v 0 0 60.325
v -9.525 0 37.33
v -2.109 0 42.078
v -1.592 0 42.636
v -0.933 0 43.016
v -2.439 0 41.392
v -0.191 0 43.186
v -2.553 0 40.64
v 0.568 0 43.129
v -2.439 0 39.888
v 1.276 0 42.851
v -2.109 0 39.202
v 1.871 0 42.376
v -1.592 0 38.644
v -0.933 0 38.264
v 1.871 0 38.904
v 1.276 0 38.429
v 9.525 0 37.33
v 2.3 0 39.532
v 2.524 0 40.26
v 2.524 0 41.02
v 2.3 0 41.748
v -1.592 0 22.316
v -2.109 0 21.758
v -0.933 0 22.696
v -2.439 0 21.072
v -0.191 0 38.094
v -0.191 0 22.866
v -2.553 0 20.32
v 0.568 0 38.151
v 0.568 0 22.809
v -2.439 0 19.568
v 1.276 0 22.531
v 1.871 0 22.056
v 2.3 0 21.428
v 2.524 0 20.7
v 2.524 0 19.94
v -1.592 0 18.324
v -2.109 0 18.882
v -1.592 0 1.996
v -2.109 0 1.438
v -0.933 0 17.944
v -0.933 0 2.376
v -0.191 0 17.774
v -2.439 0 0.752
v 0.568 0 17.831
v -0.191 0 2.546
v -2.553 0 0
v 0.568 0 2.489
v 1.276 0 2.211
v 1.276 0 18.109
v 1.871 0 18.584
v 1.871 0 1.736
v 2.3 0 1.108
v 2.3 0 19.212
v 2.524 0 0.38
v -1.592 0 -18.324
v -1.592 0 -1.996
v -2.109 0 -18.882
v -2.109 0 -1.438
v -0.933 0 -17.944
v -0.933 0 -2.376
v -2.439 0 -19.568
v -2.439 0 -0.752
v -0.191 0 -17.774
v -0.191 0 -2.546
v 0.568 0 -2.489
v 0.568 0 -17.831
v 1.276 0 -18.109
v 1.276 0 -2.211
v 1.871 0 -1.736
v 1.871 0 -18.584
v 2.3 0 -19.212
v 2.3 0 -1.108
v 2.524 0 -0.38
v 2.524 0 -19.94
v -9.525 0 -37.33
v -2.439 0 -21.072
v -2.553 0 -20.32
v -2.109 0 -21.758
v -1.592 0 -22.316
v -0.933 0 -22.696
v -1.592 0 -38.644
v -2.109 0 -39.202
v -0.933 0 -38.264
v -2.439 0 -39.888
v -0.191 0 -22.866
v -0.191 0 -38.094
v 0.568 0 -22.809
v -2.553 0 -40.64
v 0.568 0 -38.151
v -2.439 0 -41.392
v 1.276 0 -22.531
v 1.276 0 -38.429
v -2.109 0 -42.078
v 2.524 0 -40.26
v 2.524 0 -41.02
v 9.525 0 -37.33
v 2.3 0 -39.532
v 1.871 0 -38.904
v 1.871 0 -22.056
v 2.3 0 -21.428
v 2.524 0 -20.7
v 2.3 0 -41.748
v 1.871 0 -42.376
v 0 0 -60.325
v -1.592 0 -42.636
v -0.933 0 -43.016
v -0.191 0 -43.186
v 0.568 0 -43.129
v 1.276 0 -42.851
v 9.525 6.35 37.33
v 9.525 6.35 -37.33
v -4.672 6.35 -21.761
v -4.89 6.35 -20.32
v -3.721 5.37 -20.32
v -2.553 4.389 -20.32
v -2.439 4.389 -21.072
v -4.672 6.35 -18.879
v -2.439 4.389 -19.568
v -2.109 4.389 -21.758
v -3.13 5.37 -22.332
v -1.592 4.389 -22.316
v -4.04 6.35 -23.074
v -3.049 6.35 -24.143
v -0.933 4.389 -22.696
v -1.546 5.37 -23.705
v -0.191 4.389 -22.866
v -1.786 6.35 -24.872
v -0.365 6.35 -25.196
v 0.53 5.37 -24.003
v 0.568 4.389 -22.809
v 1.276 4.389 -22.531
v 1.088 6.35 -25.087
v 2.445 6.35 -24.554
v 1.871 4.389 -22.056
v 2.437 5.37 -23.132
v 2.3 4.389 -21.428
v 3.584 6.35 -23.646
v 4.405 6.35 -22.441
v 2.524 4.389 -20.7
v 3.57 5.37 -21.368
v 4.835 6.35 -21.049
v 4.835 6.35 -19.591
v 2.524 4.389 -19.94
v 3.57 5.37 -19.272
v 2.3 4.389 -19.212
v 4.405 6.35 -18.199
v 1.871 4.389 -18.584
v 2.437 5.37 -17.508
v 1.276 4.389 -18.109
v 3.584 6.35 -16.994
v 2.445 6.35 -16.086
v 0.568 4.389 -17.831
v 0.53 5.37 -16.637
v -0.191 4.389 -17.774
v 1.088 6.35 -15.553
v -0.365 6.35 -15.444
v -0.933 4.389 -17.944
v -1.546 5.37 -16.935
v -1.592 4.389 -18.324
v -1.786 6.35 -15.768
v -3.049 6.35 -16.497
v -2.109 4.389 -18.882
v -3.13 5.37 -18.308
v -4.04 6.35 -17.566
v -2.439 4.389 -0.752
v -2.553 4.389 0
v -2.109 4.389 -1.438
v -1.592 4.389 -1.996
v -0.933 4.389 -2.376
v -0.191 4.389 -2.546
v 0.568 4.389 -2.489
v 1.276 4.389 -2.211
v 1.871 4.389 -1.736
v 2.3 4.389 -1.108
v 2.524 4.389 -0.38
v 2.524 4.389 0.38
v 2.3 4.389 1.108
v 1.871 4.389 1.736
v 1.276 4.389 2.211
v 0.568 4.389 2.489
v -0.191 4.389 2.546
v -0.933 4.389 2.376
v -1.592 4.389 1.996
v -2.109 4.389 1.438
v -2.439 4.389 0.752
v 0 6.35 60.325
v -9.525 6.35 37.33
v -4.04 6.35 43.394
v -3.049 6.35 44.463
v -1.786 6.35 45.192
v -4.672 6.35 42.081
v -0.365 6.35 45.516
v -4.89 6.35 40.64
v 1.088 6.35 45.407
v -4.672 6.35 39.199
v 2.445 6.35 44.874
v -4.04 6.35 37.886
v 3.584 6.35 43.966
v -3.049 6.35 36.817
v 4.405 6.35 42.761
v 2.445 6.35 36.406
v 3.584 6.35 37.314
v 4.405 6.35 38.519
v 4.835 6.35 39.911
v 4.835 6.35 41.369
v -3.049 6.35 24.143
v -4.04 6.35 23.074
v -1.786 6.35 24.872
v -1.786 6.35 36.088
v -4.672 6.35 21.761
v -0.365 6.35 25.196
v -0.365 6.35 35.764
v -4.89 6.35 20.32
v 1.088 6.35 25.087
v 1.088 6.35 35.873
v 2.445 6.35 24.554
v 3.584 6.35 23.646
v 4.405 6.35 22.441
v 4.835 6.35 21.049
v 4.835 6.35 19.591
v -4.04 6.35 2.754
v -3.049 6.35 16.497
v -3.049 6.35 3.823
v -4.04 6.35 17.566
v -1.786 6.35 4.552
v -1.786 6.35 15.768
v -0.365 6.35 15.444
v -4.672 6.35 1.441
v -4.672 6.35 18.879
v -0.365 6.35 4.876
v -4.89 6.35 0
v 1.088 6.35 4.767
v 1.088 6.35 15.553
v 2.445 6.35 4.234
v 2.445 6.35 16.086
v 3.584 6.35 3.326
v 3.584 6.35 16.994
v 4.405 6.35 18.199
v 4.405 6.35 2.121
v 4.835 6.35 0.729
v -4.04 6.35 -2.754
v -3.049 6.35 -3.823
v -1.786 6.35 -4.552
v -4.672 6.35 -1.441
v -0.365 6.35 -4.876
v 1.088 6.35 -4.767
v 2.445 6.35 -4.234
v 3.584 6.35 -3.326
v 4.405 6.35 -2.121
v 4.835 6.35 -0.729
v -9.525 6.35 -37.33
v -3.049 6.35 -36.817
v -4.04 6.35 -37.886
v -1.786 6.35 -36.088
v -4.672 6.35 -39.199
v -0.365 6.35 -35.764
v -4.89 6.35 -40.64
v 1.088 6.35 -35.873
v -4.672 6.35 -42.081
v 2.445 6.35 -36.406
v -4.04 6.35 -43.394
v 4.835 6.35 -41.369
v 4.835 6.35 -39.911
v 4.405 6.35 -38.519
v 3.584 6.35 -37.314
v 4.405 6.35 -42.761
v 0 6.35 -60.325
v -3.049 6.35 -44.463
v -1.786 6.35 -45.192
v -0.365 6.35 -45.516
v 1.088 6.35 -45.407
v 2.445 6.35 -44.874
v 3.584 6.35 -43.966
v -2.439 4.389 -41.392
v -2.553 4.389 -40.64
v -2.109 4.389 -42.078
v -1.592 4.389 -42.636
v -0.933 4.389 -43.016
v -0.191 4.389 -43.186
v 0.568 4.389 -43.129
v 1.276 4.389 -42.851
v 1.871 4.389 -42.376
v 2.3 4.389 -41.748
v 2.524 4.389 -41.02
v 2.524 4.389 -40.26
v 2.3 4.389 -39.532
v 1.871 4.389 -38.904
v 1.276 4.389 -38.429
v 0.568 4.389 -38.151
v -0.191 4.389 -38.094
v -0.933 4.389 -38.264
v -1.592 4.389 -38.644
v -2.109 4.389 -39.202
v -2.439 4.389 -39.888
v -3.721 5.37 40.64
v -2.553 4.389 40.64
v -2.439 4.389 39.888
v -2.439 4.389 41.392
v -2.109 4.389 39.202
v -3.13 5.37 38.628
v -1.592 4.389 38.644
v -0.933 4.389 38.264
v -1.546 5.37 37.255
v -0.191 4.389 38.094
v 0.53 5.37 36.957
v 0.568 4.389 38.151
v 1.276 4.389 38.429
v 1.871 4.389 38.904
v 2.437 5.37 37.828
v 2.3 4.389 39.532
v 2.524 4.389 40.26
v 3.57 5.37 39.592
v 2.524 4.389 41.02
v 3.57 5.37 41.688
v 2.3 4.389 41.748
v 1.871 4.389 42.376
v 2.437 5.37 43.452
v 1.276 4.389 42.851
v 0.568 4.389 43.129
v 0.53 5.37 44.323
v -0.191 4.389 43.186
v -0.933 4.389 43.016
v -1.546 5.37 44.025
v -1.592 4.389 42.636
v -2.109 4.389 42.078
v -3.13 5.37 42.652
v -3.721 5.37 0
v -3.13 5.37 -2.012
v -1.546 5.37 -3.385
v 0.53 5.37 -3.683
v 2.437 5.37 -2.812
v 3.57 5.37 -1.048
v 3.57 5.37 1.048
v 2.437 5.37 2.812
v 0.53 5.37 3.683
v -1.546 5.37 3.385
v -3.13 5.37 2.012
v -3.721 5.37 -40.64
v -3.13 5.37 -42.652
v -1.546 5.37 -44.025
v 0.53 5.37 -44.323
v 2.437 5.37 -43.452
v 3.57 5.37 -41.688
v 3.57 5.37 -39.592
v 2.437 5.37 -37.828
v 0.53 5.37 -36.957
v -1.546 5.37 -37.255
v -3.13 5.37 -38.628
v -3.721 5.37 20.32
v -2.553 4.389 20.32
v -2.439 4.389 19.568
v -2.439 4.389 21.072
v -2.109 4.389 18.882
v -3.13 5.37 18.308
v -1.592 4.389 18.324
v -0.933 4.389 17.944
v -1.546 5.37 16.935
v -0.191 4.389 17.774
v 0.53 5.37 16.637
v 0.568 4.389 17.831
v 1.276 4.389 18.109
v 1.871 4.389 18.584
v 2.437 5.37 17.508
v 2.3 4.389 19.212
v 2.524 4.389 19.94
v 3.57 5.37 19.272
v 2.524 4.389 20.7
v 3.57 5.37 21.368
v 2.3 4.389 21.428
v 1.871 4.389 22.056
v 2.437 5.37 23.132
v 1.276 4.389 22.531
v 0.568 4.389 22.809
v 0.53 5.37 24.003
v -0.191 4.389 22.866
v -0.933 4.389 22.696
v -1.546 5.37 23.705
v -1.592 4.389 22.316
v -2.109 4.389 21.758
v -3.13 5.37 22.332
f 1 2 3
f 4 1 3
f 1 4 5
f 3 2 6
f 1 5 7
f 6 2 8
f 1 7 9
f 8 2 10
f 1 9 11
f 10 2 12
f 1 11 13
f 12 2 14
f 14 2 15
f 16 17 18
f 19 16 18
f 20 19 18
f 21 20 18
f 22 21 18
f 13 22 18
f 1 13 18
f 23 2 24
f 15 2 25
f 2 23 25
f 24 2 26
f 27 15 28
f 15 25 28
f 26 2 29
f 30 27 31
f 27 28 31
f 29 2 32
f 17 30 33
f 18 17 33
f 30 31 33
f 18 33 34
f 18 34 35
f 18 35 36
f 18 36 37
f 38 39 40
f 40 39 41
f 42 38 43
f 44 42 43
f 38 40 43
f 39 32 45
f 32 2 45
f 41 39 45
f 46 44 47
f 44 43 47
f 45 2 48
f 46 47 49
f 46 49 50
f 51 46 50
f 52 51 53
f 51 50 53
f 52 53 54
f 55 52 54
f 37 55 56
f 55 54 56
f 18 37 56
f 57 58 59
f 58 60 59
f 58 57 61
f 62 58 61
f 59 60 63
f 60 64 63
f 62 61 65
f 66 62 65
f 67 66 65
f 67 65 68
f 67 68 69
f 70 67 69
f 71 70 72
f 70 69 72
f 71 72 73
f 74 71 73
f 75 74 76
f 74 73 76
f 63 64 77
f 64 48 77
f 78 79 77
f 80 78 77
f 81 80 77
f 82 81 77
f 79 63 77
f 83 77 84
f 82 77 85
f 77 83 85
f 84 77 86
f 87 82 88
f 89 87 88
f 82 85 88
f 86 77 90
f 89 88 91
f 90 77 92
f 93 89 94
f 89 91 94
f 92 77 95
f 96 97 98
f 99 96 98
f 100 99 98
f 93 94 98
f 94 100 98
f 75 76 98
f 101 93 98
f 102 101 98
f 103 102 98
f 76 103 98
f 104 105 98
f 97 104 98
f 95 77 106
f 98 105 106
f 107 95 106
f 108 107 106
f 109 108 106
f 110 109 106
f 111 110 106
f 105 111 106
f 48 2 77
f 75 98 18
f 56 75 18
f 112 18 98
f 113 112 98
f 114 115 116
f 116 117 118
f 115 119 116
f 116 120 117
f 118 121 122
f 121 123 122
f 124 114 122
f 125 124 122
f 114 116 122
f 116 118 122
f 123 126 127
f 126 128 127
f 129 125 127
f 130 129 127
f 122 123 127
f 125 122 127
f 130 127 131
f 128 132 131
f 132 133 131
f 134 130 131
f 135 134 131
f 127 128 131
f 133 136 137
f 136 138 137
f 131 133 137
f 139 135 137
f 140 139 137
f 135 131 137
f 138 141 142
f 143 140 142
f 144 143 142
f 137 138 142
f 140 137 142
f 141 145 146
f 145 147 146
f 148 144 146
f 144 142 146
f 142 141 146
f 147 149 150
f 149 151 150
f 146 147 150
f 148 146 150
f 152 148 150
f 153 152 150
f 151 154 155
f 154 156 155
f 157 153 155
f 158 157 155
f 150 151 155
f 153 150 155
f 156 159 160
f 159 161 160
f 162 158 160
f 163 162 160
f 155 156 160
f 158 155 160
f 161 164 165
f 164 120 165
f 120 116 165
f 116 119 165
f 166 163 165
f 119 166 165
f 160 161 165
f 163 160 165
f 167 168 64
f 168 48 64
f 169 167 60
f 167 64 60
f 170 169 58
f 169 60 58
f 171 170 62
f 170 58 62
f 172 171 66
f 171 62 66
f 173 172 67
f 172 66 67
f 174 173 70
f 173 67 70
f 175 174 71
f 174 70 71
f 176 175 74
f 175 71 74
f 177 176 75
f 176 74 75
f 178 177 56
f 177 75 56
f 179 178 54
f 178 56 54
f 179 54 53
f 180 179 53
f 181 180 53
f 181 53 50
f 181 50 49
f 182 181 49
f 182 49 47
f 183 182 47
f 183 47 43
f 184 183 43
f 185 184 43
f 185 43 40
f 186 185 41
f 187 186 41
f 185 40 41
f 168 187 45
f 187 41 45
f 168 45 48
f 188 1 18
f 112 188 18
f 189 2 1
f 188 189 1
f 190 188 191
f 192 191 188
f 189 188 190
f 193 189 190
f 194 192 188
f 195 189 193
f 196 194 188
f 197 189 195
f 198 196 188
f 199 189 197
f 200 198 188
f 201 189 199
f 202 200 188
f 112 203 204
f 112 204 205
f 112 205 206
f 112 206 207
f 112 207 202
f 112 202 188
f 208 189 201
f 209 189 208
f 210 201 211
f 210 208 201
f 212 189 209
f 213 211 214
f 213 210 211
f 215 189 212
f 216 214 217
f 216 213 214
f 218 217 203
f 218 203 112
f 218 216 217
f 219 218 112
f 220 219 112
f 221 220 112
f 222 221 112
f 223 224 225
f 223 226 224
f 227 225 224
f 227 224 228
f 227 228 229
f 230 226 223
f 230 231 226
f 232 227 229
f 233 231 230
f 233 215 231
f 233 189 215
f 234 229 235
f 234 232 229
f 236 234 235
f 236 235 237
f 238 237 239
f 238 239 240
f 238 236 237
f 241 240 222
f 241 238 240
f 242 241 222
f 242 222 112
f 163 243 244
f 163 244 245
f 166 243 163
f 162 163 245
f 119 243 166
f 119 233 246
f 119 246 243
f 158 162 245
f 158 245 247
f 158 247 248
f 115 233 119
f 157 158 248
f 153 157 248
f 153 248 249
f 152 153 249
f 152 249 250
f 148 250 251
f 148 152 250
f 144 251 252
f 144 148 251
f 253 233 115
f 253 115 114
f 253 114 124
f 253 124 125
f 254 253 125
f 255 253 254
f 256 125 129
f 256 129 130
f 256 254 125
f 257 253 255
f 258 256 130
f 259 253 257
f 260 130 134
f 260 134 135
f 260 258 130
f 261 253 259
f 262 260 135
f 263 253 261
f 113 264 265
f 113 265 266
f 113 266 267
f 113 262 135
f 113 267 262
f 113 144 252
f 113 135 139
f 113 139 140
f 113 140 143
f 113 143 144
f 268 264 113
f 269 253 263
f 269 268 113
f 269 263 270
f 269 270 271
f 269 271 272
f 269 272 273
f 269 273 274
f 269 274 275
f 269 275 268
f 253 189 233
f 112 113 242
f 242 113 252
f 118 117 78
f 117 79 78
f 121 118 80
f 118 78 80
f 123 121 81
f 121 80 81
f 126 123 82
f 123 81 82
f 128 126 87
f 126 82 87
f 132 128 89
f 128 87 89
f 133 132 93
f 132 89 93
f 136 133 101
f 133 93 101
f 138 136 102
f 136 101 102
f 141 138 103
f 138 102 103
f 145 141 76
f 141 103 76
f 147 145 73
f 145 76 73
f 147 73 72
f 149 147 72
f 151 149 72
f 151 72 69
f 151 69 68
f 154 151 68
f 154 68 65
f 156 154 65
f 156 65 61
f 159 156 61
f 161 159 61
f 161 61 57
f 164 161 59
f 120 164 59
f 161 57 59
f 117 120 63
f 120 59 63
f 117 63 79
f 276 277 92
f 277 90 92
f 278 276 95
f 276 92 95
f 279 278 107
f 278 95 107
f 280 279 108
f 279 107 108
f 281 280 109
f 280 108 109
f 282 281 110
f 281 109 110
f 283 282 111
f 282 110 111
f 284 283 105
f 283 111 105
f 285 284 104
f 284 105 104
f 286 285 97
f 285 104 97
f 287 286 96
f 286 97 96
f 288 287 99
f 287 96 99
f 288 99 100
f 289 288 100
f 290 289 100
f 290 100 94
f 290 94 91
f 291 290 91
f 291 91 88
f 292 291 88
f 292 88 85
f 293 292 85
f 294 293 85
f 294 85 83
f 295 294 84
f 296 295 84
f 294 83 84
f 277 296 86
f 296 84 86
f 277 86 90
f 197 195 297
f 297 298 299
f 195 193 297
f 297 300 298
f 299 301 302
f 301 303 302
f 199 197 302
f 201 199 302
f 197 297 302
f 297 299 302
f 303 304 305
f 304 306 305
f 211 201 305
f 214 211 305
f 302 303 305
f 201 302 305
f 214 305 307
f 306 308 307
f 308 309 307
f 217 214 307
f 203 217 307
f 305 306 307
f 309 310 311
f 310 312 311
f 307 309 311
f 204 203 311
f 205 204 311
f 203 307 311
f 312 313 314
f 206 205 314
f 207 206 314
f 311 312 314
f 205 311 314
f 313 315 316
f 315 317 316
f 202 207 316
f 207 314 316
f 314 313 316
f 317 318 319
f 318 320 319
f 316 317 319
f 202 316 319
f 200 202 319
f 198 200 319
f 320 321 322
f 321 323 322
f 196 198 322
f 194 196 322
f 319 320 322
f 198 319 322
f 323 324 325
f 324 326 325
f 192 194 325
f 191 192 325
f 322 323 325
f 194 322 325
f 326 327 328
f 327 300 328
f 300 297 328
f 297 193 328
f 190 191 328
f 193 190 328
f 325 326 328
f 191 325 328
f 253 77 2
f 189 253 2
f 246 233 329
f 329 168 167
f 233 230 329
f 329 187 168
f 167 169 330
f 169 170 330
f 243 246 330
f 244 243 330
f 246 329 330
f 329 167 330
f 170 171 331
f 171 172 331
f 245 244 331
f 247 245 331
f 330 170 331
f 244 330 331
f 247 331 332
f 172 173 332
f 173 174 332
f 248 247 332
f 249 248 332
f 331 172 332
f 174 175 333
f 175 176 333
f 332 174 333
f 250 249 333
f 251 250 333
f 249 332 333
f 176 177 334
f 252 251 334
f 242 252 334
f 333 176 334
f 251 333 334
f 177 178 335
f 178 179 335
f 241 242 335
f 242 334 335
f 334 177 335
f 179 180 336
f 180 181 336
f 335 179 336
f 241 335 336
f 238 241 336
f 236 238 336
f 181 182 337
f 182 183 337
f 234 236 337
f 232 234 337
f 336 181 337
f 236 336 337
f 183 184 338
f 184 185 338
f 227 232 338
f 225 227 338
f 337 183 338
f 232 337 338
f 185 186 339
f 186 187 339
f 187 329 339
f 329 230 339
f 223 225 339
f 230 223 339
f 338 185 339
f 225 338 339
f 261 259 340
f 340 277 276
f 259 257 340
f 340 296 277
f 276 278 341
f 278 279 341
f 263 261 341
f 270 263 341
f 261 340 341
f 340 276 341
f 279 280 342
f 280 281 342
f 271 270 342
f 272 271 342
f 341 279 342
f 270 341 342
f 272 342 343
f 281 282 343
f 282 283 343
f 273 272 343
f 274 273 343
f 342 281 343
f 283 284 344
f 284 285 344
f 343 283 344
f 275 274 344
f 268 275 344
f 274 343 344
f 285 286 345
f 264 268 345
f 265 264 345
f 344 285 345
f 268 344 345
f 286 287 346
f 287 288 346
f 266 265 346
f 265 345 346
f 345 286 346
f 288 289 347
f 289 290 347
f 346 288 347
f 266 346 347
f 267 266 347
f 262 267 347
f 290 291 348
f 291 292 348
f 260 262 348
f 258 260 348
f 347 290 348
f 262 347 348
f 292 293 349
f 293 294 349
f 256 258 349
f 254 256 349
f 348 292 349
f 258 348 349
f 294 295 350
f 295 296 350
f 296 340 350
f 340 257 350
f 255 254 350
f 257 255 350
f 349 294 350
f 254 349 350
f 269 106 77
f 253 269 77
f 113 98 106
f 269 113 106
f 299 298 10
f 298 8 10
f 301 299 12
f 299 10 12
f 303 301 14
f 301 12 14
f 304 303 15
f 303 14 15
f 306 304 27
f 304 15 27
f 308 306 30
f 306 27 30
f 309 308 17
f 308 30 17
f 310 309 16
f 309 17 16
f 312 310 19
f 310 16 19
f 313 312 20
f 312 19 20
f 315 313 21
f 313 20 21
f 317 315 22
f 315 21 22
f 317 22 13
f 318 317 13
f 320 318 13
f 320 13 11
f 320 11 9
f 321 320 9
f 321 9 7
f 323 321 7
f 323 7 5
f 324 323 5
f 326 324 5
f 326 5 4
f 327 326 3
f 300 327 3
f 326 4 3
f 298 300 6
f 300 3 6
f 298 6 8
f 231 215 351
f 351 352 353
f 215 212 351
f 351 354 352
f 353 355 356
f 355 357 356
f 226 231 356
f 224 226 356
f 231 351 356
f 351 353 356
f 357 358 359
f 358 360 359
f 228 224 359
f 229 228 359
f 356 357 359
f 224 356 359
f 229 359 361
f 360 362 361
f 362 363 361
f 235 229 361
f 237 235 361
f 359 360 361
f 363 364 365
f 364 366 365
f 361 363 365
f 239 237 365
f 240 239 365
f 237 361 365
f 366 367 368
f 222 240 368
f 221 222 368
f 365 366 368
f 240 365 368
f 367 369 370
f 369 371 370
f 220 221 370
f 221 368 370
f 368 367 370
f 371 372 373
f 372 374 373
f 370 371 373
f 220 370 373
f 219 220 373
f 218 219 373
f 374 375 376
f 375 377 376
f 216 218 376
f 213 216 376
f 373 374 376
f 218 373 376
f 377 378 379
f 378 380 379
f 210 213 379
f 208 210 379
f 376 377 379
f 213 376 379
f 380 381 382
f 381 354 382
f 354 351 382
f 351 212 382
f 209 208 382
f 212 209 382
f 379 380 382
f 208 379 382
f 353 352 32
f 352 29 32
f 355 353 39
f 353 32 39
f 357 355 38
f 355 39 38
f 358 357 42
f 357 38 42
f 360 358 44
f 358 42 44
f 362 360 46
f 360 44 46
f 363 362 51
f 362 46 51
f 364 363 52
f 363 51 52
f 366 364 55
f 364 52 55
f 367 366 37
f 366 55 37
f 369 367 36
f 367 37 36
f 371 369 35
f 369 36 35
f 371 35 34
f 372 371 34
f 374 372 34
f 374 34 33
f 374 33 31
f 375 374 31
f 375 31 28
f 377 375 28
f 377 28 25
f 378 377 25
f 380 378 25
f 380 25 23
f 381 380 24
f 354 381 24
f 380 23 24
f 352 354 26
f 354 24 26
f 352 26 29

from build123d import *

# Parameters (mm, degrees)
BOSS_EXTRUDE1_DEPTH                                = 6.35
CSK_FOR_10_FLAT_HEAD_MACHINE_SCREW_100_D           = 5.1054
CSK_FOR_10_FLAT_HEAD_MACHINE_SCREW_100_CSINK_D     = 9.779
CSK_FOR_10_FLAT_HEAD_MACHINE_SCREW_100_CSINK_ANGLE = 100


with BuildPart() as part:
    # Sketch1 → Boss-Extrude1 (new body)
    with BuildSketch(Plane(origin=(0, 0, 0), x_dir=(1, 0, 0), z_dir=(0, 1, 0))):
        Polygon((0, 60.325), (-9.525, 37.329615818), (-9.525, -37.329615818), (0, -60.325), (9.525, -37.329615818), (9.525, 37.329615818), align=None)
    extrude(amount=BOSS_EXTRUDE1_DEPTH)

    # CSK for #10 Flat Head Machine Screw (100)1 (through all)
    with Locations(Plane(origin=(0, 6.35, 0), x_dir=(1, 0, 0), z_dir=(0, 1, 0))):
        with Locations((0, 20.32), (0, 40.64), (0, 0), (0, -20.32), (0, -40.64)):
            CounterSinkHole(CSK_FOR_10_FLAT_HEAD_MACHINE_SCREW_100_D / 2, CSK_FOR_10_FLAT_HEAD_MACHINE_SCREW_100_CSINK_D / 2, counter_sink_angle=CSK_FOR_10_FLAT_HEAD_MACHINE_SCREW_100_CSINK_ANGLE)


solid = part.part
